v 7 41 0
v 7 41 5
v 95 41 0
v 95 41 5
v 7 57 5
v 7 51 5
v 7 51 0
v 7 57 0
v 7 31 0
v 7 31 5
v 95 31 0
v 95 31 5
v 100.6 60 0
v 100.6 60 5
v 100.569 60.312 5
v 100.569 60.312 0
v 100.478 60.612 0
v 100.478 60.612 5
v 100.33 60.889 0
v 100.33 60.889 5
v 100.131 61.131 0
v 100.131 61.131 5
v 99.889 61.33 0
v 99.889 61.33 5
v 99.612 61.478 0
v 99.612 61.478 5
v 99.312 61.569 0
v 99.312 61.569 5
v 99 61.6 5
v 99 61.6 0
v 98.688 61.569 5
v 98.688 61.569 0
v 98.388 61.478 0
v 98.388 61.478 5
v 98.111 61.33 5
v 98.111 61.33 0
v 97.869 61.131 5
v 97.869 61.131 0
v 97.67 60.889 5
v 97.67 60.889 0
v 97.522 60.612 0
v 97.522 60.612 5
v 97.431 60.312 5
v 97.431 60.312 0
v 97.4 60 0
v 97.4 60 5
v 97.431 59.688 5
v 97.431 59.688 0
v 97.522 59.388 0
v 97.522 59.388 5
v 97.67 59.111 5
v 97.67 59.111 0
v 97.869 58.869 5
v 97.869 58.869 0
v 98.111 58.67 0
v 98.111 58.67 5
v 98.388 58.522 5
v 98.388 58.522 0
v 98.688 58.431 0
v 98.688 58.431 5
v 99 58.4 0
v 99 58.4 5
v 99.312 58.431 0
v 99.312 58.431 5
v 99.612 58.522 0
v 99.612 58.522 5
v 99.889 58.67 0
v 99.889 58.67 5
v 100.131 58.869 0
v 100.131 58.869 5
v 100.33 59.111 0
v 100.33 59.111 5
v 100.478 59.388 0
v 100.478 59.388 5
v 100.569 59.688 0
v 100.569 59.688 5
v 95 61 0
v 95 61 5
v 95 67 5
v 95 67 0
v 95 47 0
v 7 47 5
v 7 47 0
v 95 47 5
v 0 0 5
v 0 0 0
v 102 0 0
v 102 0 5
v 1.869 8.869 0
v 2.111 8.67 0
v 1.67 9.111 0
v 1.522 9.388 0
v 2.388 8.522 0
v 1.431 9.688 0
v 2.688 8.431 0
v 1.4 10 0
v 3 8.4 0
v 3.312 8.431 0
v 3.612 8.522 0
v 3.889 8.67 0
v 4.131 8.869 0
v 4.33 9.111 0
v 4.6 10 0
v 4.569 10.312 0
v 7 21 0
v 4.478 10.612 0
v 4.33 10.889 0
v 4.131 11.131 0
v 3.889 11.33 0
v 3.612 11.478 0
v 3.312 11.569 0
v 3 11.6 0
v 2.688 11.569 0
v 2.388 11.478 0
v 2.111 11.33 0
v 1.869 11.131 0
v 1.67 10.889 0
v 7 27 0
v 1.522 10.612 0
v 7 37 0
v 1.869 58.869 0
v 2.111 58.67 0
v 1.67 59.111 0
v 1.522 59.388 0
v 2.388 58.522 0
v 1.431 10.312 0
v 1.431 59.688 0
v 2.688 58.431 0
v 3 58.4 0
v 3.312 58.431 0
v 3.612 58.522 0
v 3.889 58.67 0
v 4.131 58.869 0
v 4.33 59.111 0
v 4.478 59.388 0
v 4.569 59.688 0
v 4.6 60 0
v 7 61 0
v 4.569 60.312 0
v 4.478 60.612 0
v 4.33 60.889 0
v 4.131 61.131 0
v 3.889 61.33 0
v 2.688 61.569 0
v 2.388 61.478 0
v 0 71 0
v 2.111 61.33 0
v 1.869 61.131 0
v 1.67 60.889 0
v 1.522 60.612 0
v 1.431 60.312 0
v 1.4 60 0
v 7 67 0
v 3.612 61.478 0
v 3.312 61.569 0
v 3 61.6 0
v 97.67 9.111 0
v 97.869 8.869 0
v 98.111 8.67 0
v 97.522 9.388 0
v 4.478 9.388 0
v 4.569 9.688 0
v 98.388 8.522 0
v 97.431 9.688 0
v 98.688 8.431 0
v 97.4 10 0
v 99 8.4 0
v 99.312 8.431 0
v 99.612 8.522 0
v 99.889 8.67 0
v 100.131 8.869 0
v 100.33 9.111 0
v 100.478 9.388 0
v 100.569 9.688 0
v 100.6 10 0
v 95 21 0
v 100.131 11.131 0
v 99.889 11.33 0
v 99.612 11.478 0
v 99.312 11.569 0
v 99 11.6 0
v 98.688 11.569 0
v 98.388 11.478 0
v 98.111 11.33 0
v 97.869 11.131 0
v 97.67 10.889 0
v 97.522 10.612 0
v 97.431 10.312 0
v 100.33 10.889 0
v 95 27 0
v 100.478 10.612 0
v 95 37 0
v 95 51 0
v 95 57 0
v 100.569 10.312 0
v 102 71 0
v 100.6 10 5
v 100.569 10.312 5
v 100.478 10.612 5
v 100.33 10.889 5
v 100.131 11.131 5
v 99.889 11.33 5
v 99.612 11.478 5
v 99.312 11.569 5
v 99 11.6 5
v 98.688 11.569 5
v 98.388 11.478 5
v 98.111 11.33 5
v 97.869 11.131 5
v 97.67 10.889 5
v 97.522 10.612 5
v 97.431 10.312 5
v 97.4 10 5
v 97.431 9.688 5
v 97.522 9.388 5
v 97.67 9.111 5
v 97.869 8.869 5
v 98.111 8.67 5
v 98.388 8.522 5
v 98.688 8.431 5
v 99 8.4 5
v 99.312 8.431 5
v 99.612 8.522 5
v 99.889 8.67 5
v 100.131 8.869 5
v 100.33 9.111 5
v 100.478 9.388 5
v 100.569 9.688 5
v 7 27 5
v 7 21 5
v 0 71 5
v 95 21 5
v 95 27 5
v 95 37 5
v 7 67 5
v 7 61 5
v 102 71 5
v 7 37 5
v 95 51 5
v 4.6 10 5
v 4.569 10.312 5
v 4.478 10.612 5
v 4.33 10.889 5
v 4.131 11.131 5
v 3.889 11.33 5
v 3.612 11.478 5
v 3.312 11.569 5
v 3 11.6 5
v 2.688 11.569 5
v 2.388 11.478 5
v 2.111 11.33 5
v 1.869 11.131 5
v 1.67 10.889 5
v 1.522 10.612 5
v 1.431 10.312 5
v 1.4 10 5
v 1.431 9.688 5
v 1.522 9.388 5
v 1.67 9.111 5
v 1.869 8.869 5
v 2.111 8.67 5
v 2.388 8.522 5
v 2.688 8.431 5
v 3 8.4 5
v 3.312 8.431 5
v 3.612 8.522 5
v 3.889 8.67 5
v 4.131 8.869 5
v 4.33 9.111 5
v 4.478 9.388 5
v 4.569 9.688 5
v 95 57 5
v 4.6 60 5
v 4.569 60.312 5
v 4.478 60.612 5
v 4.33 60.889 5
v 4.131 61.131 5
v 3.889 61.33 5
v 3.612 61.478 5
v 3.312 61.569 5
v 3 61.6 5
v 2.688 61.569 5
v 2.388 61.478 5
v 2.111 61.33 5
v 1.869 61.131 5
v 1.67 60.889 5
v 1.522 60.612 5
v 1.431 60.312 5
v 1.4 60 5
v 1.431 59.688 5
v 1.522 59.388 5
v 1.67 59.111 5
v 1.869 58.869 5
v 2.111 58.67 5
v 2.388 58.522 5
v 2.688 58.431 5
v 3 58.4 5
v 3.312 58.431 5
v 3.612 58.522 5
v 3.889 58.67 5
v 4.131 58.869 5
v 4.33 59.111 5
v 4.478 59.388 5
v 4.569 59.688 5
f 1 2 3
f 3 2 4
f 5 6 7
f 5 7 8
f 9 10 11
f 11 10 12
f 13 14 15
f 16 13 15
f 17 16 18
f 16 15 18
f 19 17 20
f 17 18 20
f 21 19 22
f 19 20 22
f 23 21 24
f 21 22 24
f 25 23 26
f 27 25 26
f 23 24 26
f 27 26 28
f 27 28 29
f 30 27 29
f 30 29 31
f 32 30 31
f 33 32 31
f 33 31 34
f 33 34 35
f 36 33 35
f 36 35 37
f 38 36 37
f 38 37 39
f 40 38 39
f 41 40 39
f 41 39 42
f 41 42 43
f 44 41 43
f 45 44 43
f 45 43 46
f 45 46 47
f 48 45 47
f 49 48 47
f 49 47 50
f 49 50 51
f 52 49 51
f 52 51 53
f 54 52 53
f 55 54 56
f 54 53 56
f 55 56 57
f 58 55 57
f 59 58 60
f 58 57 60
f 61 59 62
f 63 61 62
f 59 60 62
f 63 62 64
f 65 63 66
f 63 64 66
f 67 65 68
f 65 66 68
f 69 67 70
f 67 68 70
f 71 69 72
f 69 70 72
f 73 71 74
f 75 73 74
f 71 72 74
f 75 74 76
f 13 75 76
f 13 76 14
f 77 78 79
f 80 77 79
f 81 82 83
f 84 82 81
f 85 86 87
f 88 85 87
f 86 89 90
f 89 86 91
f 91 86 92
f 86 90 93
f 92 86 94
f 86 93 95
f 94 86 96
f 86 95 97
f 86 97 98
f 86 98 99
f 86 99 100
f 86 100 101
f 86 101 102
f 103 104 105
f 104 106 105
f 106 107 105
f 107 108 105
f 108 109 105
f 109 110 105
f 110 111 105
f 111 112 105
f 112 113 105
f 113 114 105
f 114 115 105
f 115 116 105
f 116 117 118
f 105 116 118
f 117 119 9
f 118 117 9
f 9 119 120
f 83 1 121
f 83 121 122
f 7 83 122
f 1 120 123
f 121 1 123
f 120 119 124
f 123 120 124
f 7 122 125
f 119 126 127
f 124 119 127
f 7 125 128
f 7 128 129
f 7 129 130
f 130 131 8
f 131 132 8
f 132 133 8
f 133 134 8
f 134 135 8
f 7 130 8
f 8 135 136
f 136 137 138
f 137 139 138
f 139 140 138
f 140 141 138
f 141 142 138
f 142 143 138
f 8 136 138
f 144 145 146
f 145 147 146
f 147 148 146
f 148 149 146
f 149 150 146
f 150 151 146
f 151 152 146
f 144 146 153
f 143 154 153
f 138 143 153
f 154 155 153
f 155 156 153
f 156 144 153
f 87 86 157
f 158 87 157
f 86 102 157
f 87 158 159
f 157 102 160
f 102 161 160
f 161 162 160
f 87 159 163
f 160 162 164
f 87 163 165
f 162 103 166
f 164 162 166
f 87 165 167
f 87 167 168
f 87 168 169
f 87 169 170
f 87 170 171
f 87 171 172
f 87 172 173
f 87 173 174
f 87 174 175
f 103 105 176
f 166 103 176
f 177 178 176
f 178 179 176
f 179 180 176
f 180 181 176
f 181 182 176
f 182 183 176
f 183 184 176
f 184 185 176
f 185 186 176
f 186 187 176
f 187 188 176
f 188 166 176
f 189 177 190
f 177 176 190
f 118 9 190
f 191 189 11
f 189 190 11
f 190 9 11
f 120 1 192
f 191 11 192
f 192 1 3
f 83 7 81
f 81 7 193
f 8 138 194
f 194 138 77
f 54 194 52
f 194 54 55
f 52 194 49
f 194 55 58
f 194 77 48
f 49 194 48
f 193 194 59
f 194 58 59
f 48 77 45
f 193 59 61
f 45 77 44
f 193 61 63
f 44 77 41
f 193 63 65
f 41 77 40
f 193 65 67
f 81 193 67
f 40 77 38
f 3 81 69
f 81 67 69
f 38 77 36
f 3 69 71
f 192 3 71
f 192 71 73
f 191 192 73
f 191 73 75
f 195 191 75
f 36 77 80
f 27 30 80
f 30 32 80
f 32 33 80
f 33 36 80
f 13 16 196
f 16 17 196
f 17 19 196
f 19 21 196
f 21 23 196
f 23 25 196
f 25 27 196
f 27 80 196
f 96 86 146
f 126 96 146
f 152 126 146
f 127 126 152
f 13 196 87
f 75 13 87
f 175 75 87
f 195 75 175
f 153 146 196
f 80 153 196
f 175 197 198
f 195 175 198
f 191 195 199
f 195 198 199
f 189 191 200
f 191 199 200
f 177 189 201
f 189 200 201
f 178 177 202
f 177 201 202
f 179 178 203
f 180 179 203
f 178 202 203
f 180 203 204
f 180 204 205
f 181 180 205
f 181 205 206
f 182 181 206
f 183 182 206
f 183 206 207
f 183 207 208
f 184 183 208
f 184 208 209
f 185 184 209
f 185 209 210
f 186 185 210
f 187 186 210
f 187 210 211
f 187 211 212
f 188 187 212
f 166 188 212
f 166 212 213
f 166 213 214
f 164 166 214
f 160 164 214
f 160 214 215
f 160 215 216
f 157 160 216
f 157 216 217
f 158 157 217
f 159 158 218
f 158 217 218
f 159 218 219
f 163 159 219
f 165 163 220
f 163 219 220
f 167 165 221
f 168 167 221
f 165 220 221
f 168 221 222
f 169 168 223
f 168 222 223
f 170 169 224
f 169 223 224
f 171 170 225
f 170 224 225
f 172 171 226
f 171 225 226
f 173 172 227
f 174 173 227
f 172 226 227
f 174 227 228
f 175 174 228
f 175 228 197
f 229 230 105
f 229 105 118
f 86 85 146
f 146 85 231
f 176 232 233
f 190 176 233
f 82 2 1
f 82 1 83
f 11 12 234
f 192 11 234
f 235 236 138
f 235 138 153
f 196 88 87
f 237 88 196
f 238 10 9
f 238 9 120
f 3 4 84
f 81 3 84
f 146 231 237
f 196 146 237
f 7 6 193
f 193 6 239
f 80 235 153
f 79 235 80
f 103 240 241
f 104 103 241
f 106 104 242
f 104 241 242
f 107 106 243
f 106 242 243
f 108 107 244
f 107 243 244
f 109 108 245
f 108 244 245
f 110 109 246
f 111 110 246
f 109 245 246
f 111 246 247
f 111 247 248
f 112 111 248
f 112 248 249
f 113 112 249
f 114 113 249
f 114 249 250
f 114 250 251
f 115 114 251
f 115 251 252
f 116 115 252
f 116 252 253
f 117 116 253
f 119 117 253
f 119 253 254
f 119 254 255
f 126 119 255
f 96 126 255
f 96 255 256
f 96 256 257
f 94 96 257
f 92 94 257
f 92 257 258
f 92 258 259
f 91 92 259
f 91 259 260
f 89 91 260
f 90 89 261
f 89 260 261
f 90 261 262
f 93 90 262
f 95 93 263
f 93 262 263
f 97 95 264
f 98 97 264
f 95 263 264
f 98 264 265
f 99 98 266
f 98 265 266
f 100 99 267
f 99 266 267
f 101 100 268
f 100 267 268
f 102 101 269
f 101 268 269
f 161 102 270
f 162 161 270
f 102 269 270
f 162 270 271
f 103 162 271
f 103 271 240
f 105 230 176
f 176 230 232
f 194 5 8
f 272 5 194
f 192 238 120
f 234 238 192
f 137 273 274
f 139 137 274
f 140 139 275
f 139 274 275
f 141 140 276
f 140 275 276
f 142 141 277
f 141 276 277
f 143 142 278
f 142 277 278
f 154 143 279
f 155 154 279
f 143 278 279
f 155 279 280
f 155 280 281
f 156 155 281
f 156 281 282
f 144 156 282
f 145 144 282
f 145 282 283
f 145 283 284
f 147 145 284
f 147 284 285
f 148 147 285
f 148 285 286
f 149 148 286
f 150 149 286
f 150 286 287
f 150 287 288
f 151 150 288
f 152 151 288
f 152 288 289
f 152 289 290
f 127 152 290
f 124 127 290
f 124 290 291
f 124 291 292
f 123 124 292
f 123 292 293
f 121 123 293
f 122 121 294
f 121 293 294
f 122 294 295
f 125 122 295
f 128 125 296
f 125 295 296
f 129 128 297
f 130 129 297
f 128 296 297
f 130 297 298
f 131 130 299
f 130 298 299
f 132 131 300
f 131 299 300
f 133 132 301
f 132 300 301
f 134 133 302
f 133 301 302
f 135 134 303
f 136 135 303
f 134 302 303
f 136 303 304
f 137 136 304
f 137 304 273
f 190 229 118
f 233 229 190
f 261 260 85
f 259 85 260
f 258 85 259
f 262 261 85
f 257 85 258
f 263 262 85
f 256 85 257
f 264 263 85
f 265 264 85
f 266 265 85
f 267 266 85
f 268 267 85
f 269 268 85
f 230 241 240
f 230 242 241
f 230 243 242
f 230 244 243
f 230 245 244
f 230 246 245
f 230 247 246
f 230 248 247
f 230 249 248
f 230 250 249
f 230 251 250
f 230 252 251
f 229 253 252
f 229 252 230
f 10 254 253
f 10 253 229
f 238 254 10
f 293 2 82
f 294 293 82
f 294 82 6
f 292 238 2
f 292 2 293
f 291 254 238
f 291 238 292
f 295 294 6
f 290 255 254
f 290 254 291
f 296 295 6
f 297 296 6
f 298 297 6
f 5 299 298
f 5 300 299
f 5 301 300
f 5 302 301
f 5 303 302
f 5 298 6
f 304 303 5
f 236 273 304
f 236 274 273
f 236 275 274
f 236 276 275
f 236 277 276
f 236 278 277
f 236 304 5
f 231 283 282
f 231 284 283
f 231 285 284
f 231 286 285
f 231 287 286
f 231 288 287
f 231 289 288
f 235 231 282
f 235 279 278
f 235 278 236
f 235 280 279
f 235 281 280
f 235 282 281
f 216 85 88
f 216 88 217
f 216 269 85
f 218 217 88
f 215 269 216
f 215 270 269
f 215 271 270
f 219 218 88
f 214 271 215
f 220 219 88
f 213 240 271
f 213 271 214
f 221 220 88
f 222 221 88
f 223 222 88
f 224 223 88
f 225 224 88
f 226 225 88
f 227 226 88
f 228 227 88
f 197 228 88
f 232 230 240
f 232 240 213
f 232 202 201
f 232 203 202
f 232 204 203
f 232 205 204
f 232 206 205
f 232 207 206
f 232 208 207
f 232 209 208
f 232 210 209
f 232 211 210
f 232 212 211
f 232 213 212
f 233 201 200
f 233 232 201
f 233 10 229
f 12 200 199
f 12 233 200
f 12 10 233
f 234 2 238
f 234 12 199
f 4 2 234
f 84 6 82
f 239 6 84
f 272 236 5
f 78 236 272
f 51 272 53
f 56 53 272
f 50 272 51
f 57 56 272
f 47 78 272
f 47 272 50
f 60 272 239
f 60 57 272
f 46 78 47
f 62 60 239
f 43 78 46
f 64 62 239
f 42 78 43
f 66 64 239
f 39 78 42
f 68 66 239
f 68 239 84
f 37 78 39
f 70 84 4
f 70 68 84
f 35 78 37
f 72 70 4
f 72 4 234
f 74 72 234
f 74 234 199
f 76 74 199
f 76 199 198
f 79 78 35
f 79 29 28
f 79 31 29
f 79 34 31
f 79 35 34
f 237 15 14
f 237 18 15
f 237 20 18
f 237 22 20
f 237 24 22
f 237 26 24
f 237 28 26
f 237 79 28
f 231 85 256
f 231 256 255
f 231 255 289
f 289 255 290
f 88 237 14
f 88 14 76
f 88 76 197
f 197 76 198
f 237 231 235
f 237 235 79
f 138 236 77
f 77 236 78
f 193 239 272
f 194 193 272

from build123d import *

# Parameters (mm, degrees)
SKETCH_1_W             = 102
SKETCH_1_H             = 65
EXTRUDE_1_DEPTH        = 5
SKETCH_2_R             = 1.6
CUT_EXTRUDE_1_DEPTH    = 122.053707089
SKETCH_3_W             = 102
SKETCH_3_H             = 6
EXTRUDE_2_DEPTH        = 5
SKETCH_4_W             = 88
SKETCH_4_H             = 6
CUT_EXTRUDE_2_DEPTH    = 125.378454726
PATTERN_LINEAR_1_COUNT = 5
PATTERN_LINEAR_1_PITCH = 10


with BuildPart() as part:
    # 草图1 → 凸台-拉伸1 (new body)
    with BuildSketch(Plane.XY):
        with Locations((51, 32.5)):
            Rectangle(SKETCH_1_W, SKETCH_1_H)
    extrude(amount=EXTRUDE_1_DEPTH)

    # 草图2 → 切除-拉伸1 (cut, through all)
    with BuildSketch(Plane.XY.offset(5)):
        with Locations((3, 60)):
            Circle(SKETCH_2_R)
        with Locations((99, 10)):
            Circle(SKETCH_2_R)
        with Locations((3, 10)):
            Circle(SKETCH_2_R)
        with Locations((99, 60)):
            Circle(SKETCH_2_R)
    extrude(amount=-CUT_EXTRUDE_1_DEPTH, mode=Mode.SUBTRACT)

    # 草图3 → 凸台-拉伸2 (add)
    with BuildSketch(Plane.XY.offset(5)):
        with Locations((51, 68)):
            Rectangle(SKETCH_3_W, SKETCH_3_H)
    extrude(amount=-EXTRUDE_2_DEPTH)

    # 草图4 → 切除-拉伸2 (cut, through all)
    with BuildSketch(Plane.XY.offset(5)):
        with Locations((51, 64)):
            Rectangle(SKETCH_4_W, SKETCH_4_H)
    cut_extrude_2 = extrude(amount=-CUT_EXTRUDE_2_DEPTH, mode=Mode.SUBTRACT)

    # 阵列(线性)1: 切除-拉伸2 ×5
    with Locations(*[(0, -i * PATTERN_LINEAR_1_PITCH, 0) for i in range(1, PATTERN_LINEAR_1_COUNT)]):
        add(cut_extrude_2, mode=Mode.SUBTRACT)


solid = part.part
